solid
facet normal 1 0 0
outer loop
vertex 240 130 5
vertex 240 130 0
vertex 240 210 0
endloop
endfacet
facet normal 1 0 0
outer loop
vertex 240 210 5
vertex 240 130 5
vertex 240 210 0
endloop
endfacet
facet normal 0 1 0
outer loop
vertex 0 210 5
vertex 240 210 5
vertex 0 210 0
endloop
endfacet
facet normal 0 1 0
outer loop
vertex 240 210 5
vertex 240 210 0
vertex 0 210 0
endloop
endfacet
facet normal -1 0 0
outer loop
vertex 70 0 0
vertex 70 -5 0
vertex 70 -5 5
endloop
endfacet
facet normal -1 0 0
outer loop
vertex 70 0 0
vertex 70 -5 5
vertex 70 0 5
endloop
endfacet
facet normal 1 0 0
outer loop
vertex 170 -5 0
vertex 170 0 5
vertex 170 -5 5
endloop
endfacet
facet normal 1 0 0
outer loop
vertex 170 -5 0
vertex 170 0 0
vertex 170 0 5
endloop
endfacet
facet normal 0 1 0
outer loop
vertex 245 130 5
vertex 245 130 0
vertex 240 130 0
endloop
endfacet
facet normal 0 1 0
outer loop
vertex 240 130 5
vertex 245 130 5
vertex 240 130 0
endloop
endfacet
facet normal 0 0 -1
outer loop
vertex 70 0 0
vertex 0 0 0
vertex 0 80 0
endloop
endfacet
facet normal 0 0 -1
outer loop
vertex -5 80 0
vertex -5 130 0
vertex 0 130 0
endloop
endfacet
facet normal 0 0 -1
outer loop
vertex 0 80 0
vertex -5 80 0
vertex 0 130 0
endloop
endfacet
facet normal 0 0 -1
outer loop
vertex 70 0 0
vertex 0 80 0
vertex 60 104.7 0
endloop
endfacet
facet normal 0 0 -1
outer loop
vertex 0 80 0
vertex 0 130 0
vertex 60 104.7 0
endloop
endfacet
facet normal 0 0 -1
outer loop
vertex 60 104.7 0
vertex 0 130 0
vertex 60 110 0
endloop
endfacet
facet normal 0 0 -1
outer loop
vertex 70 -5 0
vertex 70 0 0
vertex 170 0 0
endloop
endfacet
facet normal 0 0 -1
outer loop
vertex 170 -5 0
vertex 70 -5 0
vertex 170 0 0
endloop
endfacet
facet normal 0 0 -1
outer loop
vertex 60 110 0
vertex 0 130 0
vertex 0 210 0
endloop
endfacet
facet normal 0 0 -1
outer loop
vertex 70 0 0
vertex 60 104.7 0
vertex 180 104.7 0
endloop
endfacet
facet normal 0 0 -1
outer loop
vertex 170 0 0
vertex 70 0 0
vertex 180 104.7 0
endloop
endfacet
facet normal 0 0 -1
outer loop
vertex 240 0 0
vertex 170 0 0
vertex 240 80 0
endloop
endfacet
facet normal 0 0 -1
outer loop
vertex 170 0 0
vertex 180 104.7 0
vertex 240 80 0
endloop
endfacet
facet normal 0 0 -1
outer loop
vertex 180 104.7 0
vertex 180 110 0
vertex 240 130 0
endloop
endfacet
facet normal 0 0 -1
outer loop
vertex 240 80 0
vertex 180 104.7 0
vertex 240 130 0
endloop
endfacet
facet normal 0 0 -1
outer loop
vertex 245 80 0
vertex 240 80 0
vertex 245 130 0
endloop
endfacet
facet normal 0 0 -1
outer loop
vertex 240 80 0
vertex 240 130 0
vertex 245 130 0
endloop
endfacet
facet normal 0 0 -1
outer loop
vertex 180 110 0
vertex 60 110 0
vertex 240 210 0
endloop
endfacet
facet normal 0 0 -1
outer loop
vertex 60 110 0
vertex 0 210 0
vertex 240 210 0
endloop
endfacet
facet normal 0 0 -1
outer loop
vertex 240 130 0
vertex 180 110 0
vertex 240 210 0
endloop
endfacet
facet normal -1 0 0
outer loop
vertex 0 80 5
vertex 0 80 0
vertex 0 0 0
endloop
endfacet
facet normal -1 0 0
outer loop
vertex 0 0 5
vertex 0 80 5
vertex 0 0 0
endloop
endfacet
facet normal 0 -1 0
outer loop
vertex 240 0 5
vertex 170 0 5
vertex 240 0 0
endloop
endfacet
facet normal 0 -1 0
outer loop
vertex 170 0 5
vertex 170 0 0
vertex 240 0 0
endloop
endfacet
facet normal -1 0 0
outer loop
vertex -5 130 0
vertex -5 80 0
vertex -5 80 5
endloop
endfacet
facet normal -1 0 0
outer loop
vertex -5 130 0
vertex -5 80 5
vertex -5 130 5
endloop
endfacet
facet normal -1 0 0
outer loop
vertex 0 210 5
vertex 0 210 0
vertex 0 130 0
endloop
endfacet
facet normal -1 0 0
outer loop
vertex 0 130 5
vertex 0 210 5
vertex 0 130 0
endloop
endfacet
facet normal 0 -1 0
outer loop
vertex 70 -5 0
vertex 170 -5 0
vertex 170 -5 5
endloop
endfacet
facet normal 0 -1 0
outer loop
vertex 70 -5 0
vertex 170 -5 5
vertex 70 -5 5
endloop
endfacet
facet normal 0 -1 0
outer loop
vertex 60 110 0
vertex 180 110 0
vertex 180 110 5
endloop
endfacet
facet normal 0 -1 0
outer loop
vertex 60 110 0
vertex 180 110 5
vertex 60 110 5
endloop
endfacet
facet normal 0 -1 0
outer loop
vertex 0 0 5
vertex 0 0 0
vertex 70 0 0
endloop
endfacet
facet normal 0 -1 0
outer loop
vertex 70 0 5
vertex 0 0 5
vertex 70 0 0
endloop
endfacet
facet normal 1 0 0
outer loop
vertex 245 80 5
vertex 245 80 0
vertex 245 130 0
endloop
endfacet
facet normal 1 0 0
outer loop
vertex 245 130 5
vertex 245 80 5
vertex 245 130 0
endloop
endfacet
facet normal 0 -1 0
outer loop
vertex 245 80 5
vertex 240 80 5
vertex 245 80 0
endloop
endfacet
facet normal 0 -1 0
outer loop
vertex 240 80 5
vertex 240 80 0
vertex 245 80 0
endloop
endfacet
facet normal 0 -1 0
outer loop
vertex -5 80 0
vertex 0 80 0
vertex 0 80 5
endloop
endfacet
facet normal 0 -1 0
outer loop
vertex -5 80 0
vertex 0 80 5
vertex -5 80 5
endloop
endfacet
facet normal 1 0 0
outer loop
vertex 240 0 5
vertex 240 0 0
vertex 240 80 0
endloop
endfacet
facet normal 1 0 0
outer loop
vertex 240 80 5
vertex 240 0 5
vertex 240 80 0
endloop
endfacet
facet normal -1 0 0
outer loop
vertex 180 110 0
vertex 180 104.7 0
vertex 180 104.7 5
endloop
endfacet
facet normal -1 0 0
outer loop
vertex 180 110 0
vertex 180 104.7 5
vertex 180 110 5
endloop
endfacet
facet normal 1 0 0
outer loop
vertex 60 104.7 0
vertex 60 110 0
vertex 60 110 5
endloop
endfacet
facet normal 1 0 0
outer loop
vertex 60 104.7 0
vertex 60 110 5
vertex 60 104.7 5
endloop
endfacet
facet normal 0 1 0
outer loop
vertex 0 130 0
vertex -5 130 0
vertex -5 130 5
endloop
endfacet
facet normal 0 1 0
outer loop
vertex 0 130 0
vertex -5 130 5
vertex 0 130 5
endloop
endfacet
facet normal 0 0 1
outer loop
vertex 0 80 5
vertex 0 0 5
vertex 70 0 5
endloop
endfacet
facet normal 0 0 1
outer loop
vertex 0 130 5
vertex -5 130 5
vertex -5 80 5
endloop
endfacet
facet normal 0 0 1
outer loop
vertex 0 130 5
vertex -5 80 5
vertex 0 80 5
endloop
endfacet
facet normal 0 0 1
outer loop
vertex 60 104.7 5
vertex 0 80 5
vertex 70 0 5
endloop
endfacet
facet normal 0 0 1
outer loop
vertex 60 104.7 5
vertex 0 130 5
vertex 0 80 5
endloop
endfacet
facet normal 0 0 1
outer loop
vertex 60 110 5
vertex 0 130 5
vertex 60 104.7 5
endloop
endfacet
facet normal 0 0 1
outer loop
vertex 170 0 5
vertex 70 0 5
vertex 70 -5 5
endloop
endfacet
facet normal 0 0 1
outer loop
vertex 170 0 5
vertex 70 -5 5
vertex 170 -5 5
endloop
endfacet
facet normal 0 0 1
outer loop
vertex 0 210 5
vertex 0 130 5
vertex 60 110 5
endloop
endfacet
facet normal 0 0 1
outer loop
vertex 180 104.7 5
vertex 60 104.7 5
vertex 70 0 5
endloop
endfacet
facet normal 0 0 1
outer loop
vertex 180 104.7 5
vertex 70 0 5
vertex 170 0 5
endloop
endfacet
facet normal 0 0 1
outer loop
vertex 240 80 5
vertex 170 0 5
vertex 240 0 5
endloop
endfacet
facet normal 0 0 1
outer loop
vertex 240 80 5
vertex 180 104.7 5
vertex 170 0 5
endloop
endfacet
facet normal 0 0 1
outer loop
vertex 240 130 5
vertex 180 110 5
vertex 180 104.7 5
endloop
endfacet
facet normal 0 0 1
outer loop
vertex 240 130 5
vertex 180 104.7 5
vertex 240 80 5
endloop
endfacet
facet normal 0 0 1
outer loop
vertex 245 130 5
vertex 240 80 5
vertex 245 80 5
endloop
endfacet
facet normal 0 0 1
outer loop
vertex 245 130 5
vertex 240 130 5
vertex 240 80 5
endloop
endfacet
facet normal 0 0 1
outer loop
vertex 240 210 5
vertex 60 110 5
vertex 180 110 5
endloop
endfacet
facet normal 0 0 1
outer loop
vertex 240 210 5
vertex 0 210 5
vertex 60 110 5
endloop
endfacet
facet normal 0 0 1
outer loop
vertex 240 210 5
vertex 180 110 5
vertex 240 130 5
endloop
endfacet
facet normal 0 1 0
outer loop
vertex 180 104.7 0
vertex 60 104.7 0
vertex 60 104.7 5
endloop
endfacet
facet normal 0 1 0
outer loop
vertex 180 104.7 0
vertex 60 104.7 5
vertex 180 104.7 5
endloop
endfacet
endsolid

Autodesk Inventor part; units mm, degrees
ref_plane "YZ Plane" through (0, 0, 0) normal (1, 0, 0) x (0, 1, 0)
ref_plane "XZ Plane" through (0, 0, 0) normal (0, 1, 0) x (-1, 0, 0)
ref_plane "XY Plane" through (0, 0, 0) normal (0, 0, 1) x (1, 0, 0)
sketch "Sketch1" plane through (0, 0, 0) normal (0, 0, 1) x (1, 0, 0)
  line L0 (0, 0) -> (240, 0)
  line L1 (240, 0) -> (240, 210)
  line L2 (240, 210) -> (0, 210)
  line L3 (0, 210) -> (0, 0)
  line L4 (0, 80) -> (-5, 80)
  line L5 (-5, 80) -> (-5, 130)
  line L6 (-5, 130) -> (0, 130)
  line L7 (0, 130) -> (0, 80)
  line L8 (120, 0) -> (120, 210) construction
  line L9 (240, 80) -> (245, 80)
  line L10 (245, 80) -> (245, 130)
  line L11 (245, 130) -> (240, 130)
  line L12 (240, 130) -> (240, 80)
  line L13 (60, 104.7) -> (180, 104.7)
  line L14 (180, 104.7) -> (180, 110)
  line L15 (180, 110) -> (60, 110)
  line L16 (60, 110) -> (60, 104.7)
  line L17 (70, 0) -> (170, 0)
  line L18 (170, 0) -> (170, -5)
  line L19 (170, -5) -> (70, -5)
  line L20 (70, -5) -> (70, 0)
  point P0 (240, 80)
  point P1 (170, 0)
  dimension "d0" = 240
  dimension "d1" = 210
  dimension "d2" = 5
  dimension "d3" = 50
  dimension "d6" = 120
  dimension "d7" = 5.3
  dimension "d10" = 100
  dimension "d11" = 5
  dimension "d12" = 50
extrude "Extrusion1" add sketch "Sketch1" along normal blind 5
properties part number "back"
